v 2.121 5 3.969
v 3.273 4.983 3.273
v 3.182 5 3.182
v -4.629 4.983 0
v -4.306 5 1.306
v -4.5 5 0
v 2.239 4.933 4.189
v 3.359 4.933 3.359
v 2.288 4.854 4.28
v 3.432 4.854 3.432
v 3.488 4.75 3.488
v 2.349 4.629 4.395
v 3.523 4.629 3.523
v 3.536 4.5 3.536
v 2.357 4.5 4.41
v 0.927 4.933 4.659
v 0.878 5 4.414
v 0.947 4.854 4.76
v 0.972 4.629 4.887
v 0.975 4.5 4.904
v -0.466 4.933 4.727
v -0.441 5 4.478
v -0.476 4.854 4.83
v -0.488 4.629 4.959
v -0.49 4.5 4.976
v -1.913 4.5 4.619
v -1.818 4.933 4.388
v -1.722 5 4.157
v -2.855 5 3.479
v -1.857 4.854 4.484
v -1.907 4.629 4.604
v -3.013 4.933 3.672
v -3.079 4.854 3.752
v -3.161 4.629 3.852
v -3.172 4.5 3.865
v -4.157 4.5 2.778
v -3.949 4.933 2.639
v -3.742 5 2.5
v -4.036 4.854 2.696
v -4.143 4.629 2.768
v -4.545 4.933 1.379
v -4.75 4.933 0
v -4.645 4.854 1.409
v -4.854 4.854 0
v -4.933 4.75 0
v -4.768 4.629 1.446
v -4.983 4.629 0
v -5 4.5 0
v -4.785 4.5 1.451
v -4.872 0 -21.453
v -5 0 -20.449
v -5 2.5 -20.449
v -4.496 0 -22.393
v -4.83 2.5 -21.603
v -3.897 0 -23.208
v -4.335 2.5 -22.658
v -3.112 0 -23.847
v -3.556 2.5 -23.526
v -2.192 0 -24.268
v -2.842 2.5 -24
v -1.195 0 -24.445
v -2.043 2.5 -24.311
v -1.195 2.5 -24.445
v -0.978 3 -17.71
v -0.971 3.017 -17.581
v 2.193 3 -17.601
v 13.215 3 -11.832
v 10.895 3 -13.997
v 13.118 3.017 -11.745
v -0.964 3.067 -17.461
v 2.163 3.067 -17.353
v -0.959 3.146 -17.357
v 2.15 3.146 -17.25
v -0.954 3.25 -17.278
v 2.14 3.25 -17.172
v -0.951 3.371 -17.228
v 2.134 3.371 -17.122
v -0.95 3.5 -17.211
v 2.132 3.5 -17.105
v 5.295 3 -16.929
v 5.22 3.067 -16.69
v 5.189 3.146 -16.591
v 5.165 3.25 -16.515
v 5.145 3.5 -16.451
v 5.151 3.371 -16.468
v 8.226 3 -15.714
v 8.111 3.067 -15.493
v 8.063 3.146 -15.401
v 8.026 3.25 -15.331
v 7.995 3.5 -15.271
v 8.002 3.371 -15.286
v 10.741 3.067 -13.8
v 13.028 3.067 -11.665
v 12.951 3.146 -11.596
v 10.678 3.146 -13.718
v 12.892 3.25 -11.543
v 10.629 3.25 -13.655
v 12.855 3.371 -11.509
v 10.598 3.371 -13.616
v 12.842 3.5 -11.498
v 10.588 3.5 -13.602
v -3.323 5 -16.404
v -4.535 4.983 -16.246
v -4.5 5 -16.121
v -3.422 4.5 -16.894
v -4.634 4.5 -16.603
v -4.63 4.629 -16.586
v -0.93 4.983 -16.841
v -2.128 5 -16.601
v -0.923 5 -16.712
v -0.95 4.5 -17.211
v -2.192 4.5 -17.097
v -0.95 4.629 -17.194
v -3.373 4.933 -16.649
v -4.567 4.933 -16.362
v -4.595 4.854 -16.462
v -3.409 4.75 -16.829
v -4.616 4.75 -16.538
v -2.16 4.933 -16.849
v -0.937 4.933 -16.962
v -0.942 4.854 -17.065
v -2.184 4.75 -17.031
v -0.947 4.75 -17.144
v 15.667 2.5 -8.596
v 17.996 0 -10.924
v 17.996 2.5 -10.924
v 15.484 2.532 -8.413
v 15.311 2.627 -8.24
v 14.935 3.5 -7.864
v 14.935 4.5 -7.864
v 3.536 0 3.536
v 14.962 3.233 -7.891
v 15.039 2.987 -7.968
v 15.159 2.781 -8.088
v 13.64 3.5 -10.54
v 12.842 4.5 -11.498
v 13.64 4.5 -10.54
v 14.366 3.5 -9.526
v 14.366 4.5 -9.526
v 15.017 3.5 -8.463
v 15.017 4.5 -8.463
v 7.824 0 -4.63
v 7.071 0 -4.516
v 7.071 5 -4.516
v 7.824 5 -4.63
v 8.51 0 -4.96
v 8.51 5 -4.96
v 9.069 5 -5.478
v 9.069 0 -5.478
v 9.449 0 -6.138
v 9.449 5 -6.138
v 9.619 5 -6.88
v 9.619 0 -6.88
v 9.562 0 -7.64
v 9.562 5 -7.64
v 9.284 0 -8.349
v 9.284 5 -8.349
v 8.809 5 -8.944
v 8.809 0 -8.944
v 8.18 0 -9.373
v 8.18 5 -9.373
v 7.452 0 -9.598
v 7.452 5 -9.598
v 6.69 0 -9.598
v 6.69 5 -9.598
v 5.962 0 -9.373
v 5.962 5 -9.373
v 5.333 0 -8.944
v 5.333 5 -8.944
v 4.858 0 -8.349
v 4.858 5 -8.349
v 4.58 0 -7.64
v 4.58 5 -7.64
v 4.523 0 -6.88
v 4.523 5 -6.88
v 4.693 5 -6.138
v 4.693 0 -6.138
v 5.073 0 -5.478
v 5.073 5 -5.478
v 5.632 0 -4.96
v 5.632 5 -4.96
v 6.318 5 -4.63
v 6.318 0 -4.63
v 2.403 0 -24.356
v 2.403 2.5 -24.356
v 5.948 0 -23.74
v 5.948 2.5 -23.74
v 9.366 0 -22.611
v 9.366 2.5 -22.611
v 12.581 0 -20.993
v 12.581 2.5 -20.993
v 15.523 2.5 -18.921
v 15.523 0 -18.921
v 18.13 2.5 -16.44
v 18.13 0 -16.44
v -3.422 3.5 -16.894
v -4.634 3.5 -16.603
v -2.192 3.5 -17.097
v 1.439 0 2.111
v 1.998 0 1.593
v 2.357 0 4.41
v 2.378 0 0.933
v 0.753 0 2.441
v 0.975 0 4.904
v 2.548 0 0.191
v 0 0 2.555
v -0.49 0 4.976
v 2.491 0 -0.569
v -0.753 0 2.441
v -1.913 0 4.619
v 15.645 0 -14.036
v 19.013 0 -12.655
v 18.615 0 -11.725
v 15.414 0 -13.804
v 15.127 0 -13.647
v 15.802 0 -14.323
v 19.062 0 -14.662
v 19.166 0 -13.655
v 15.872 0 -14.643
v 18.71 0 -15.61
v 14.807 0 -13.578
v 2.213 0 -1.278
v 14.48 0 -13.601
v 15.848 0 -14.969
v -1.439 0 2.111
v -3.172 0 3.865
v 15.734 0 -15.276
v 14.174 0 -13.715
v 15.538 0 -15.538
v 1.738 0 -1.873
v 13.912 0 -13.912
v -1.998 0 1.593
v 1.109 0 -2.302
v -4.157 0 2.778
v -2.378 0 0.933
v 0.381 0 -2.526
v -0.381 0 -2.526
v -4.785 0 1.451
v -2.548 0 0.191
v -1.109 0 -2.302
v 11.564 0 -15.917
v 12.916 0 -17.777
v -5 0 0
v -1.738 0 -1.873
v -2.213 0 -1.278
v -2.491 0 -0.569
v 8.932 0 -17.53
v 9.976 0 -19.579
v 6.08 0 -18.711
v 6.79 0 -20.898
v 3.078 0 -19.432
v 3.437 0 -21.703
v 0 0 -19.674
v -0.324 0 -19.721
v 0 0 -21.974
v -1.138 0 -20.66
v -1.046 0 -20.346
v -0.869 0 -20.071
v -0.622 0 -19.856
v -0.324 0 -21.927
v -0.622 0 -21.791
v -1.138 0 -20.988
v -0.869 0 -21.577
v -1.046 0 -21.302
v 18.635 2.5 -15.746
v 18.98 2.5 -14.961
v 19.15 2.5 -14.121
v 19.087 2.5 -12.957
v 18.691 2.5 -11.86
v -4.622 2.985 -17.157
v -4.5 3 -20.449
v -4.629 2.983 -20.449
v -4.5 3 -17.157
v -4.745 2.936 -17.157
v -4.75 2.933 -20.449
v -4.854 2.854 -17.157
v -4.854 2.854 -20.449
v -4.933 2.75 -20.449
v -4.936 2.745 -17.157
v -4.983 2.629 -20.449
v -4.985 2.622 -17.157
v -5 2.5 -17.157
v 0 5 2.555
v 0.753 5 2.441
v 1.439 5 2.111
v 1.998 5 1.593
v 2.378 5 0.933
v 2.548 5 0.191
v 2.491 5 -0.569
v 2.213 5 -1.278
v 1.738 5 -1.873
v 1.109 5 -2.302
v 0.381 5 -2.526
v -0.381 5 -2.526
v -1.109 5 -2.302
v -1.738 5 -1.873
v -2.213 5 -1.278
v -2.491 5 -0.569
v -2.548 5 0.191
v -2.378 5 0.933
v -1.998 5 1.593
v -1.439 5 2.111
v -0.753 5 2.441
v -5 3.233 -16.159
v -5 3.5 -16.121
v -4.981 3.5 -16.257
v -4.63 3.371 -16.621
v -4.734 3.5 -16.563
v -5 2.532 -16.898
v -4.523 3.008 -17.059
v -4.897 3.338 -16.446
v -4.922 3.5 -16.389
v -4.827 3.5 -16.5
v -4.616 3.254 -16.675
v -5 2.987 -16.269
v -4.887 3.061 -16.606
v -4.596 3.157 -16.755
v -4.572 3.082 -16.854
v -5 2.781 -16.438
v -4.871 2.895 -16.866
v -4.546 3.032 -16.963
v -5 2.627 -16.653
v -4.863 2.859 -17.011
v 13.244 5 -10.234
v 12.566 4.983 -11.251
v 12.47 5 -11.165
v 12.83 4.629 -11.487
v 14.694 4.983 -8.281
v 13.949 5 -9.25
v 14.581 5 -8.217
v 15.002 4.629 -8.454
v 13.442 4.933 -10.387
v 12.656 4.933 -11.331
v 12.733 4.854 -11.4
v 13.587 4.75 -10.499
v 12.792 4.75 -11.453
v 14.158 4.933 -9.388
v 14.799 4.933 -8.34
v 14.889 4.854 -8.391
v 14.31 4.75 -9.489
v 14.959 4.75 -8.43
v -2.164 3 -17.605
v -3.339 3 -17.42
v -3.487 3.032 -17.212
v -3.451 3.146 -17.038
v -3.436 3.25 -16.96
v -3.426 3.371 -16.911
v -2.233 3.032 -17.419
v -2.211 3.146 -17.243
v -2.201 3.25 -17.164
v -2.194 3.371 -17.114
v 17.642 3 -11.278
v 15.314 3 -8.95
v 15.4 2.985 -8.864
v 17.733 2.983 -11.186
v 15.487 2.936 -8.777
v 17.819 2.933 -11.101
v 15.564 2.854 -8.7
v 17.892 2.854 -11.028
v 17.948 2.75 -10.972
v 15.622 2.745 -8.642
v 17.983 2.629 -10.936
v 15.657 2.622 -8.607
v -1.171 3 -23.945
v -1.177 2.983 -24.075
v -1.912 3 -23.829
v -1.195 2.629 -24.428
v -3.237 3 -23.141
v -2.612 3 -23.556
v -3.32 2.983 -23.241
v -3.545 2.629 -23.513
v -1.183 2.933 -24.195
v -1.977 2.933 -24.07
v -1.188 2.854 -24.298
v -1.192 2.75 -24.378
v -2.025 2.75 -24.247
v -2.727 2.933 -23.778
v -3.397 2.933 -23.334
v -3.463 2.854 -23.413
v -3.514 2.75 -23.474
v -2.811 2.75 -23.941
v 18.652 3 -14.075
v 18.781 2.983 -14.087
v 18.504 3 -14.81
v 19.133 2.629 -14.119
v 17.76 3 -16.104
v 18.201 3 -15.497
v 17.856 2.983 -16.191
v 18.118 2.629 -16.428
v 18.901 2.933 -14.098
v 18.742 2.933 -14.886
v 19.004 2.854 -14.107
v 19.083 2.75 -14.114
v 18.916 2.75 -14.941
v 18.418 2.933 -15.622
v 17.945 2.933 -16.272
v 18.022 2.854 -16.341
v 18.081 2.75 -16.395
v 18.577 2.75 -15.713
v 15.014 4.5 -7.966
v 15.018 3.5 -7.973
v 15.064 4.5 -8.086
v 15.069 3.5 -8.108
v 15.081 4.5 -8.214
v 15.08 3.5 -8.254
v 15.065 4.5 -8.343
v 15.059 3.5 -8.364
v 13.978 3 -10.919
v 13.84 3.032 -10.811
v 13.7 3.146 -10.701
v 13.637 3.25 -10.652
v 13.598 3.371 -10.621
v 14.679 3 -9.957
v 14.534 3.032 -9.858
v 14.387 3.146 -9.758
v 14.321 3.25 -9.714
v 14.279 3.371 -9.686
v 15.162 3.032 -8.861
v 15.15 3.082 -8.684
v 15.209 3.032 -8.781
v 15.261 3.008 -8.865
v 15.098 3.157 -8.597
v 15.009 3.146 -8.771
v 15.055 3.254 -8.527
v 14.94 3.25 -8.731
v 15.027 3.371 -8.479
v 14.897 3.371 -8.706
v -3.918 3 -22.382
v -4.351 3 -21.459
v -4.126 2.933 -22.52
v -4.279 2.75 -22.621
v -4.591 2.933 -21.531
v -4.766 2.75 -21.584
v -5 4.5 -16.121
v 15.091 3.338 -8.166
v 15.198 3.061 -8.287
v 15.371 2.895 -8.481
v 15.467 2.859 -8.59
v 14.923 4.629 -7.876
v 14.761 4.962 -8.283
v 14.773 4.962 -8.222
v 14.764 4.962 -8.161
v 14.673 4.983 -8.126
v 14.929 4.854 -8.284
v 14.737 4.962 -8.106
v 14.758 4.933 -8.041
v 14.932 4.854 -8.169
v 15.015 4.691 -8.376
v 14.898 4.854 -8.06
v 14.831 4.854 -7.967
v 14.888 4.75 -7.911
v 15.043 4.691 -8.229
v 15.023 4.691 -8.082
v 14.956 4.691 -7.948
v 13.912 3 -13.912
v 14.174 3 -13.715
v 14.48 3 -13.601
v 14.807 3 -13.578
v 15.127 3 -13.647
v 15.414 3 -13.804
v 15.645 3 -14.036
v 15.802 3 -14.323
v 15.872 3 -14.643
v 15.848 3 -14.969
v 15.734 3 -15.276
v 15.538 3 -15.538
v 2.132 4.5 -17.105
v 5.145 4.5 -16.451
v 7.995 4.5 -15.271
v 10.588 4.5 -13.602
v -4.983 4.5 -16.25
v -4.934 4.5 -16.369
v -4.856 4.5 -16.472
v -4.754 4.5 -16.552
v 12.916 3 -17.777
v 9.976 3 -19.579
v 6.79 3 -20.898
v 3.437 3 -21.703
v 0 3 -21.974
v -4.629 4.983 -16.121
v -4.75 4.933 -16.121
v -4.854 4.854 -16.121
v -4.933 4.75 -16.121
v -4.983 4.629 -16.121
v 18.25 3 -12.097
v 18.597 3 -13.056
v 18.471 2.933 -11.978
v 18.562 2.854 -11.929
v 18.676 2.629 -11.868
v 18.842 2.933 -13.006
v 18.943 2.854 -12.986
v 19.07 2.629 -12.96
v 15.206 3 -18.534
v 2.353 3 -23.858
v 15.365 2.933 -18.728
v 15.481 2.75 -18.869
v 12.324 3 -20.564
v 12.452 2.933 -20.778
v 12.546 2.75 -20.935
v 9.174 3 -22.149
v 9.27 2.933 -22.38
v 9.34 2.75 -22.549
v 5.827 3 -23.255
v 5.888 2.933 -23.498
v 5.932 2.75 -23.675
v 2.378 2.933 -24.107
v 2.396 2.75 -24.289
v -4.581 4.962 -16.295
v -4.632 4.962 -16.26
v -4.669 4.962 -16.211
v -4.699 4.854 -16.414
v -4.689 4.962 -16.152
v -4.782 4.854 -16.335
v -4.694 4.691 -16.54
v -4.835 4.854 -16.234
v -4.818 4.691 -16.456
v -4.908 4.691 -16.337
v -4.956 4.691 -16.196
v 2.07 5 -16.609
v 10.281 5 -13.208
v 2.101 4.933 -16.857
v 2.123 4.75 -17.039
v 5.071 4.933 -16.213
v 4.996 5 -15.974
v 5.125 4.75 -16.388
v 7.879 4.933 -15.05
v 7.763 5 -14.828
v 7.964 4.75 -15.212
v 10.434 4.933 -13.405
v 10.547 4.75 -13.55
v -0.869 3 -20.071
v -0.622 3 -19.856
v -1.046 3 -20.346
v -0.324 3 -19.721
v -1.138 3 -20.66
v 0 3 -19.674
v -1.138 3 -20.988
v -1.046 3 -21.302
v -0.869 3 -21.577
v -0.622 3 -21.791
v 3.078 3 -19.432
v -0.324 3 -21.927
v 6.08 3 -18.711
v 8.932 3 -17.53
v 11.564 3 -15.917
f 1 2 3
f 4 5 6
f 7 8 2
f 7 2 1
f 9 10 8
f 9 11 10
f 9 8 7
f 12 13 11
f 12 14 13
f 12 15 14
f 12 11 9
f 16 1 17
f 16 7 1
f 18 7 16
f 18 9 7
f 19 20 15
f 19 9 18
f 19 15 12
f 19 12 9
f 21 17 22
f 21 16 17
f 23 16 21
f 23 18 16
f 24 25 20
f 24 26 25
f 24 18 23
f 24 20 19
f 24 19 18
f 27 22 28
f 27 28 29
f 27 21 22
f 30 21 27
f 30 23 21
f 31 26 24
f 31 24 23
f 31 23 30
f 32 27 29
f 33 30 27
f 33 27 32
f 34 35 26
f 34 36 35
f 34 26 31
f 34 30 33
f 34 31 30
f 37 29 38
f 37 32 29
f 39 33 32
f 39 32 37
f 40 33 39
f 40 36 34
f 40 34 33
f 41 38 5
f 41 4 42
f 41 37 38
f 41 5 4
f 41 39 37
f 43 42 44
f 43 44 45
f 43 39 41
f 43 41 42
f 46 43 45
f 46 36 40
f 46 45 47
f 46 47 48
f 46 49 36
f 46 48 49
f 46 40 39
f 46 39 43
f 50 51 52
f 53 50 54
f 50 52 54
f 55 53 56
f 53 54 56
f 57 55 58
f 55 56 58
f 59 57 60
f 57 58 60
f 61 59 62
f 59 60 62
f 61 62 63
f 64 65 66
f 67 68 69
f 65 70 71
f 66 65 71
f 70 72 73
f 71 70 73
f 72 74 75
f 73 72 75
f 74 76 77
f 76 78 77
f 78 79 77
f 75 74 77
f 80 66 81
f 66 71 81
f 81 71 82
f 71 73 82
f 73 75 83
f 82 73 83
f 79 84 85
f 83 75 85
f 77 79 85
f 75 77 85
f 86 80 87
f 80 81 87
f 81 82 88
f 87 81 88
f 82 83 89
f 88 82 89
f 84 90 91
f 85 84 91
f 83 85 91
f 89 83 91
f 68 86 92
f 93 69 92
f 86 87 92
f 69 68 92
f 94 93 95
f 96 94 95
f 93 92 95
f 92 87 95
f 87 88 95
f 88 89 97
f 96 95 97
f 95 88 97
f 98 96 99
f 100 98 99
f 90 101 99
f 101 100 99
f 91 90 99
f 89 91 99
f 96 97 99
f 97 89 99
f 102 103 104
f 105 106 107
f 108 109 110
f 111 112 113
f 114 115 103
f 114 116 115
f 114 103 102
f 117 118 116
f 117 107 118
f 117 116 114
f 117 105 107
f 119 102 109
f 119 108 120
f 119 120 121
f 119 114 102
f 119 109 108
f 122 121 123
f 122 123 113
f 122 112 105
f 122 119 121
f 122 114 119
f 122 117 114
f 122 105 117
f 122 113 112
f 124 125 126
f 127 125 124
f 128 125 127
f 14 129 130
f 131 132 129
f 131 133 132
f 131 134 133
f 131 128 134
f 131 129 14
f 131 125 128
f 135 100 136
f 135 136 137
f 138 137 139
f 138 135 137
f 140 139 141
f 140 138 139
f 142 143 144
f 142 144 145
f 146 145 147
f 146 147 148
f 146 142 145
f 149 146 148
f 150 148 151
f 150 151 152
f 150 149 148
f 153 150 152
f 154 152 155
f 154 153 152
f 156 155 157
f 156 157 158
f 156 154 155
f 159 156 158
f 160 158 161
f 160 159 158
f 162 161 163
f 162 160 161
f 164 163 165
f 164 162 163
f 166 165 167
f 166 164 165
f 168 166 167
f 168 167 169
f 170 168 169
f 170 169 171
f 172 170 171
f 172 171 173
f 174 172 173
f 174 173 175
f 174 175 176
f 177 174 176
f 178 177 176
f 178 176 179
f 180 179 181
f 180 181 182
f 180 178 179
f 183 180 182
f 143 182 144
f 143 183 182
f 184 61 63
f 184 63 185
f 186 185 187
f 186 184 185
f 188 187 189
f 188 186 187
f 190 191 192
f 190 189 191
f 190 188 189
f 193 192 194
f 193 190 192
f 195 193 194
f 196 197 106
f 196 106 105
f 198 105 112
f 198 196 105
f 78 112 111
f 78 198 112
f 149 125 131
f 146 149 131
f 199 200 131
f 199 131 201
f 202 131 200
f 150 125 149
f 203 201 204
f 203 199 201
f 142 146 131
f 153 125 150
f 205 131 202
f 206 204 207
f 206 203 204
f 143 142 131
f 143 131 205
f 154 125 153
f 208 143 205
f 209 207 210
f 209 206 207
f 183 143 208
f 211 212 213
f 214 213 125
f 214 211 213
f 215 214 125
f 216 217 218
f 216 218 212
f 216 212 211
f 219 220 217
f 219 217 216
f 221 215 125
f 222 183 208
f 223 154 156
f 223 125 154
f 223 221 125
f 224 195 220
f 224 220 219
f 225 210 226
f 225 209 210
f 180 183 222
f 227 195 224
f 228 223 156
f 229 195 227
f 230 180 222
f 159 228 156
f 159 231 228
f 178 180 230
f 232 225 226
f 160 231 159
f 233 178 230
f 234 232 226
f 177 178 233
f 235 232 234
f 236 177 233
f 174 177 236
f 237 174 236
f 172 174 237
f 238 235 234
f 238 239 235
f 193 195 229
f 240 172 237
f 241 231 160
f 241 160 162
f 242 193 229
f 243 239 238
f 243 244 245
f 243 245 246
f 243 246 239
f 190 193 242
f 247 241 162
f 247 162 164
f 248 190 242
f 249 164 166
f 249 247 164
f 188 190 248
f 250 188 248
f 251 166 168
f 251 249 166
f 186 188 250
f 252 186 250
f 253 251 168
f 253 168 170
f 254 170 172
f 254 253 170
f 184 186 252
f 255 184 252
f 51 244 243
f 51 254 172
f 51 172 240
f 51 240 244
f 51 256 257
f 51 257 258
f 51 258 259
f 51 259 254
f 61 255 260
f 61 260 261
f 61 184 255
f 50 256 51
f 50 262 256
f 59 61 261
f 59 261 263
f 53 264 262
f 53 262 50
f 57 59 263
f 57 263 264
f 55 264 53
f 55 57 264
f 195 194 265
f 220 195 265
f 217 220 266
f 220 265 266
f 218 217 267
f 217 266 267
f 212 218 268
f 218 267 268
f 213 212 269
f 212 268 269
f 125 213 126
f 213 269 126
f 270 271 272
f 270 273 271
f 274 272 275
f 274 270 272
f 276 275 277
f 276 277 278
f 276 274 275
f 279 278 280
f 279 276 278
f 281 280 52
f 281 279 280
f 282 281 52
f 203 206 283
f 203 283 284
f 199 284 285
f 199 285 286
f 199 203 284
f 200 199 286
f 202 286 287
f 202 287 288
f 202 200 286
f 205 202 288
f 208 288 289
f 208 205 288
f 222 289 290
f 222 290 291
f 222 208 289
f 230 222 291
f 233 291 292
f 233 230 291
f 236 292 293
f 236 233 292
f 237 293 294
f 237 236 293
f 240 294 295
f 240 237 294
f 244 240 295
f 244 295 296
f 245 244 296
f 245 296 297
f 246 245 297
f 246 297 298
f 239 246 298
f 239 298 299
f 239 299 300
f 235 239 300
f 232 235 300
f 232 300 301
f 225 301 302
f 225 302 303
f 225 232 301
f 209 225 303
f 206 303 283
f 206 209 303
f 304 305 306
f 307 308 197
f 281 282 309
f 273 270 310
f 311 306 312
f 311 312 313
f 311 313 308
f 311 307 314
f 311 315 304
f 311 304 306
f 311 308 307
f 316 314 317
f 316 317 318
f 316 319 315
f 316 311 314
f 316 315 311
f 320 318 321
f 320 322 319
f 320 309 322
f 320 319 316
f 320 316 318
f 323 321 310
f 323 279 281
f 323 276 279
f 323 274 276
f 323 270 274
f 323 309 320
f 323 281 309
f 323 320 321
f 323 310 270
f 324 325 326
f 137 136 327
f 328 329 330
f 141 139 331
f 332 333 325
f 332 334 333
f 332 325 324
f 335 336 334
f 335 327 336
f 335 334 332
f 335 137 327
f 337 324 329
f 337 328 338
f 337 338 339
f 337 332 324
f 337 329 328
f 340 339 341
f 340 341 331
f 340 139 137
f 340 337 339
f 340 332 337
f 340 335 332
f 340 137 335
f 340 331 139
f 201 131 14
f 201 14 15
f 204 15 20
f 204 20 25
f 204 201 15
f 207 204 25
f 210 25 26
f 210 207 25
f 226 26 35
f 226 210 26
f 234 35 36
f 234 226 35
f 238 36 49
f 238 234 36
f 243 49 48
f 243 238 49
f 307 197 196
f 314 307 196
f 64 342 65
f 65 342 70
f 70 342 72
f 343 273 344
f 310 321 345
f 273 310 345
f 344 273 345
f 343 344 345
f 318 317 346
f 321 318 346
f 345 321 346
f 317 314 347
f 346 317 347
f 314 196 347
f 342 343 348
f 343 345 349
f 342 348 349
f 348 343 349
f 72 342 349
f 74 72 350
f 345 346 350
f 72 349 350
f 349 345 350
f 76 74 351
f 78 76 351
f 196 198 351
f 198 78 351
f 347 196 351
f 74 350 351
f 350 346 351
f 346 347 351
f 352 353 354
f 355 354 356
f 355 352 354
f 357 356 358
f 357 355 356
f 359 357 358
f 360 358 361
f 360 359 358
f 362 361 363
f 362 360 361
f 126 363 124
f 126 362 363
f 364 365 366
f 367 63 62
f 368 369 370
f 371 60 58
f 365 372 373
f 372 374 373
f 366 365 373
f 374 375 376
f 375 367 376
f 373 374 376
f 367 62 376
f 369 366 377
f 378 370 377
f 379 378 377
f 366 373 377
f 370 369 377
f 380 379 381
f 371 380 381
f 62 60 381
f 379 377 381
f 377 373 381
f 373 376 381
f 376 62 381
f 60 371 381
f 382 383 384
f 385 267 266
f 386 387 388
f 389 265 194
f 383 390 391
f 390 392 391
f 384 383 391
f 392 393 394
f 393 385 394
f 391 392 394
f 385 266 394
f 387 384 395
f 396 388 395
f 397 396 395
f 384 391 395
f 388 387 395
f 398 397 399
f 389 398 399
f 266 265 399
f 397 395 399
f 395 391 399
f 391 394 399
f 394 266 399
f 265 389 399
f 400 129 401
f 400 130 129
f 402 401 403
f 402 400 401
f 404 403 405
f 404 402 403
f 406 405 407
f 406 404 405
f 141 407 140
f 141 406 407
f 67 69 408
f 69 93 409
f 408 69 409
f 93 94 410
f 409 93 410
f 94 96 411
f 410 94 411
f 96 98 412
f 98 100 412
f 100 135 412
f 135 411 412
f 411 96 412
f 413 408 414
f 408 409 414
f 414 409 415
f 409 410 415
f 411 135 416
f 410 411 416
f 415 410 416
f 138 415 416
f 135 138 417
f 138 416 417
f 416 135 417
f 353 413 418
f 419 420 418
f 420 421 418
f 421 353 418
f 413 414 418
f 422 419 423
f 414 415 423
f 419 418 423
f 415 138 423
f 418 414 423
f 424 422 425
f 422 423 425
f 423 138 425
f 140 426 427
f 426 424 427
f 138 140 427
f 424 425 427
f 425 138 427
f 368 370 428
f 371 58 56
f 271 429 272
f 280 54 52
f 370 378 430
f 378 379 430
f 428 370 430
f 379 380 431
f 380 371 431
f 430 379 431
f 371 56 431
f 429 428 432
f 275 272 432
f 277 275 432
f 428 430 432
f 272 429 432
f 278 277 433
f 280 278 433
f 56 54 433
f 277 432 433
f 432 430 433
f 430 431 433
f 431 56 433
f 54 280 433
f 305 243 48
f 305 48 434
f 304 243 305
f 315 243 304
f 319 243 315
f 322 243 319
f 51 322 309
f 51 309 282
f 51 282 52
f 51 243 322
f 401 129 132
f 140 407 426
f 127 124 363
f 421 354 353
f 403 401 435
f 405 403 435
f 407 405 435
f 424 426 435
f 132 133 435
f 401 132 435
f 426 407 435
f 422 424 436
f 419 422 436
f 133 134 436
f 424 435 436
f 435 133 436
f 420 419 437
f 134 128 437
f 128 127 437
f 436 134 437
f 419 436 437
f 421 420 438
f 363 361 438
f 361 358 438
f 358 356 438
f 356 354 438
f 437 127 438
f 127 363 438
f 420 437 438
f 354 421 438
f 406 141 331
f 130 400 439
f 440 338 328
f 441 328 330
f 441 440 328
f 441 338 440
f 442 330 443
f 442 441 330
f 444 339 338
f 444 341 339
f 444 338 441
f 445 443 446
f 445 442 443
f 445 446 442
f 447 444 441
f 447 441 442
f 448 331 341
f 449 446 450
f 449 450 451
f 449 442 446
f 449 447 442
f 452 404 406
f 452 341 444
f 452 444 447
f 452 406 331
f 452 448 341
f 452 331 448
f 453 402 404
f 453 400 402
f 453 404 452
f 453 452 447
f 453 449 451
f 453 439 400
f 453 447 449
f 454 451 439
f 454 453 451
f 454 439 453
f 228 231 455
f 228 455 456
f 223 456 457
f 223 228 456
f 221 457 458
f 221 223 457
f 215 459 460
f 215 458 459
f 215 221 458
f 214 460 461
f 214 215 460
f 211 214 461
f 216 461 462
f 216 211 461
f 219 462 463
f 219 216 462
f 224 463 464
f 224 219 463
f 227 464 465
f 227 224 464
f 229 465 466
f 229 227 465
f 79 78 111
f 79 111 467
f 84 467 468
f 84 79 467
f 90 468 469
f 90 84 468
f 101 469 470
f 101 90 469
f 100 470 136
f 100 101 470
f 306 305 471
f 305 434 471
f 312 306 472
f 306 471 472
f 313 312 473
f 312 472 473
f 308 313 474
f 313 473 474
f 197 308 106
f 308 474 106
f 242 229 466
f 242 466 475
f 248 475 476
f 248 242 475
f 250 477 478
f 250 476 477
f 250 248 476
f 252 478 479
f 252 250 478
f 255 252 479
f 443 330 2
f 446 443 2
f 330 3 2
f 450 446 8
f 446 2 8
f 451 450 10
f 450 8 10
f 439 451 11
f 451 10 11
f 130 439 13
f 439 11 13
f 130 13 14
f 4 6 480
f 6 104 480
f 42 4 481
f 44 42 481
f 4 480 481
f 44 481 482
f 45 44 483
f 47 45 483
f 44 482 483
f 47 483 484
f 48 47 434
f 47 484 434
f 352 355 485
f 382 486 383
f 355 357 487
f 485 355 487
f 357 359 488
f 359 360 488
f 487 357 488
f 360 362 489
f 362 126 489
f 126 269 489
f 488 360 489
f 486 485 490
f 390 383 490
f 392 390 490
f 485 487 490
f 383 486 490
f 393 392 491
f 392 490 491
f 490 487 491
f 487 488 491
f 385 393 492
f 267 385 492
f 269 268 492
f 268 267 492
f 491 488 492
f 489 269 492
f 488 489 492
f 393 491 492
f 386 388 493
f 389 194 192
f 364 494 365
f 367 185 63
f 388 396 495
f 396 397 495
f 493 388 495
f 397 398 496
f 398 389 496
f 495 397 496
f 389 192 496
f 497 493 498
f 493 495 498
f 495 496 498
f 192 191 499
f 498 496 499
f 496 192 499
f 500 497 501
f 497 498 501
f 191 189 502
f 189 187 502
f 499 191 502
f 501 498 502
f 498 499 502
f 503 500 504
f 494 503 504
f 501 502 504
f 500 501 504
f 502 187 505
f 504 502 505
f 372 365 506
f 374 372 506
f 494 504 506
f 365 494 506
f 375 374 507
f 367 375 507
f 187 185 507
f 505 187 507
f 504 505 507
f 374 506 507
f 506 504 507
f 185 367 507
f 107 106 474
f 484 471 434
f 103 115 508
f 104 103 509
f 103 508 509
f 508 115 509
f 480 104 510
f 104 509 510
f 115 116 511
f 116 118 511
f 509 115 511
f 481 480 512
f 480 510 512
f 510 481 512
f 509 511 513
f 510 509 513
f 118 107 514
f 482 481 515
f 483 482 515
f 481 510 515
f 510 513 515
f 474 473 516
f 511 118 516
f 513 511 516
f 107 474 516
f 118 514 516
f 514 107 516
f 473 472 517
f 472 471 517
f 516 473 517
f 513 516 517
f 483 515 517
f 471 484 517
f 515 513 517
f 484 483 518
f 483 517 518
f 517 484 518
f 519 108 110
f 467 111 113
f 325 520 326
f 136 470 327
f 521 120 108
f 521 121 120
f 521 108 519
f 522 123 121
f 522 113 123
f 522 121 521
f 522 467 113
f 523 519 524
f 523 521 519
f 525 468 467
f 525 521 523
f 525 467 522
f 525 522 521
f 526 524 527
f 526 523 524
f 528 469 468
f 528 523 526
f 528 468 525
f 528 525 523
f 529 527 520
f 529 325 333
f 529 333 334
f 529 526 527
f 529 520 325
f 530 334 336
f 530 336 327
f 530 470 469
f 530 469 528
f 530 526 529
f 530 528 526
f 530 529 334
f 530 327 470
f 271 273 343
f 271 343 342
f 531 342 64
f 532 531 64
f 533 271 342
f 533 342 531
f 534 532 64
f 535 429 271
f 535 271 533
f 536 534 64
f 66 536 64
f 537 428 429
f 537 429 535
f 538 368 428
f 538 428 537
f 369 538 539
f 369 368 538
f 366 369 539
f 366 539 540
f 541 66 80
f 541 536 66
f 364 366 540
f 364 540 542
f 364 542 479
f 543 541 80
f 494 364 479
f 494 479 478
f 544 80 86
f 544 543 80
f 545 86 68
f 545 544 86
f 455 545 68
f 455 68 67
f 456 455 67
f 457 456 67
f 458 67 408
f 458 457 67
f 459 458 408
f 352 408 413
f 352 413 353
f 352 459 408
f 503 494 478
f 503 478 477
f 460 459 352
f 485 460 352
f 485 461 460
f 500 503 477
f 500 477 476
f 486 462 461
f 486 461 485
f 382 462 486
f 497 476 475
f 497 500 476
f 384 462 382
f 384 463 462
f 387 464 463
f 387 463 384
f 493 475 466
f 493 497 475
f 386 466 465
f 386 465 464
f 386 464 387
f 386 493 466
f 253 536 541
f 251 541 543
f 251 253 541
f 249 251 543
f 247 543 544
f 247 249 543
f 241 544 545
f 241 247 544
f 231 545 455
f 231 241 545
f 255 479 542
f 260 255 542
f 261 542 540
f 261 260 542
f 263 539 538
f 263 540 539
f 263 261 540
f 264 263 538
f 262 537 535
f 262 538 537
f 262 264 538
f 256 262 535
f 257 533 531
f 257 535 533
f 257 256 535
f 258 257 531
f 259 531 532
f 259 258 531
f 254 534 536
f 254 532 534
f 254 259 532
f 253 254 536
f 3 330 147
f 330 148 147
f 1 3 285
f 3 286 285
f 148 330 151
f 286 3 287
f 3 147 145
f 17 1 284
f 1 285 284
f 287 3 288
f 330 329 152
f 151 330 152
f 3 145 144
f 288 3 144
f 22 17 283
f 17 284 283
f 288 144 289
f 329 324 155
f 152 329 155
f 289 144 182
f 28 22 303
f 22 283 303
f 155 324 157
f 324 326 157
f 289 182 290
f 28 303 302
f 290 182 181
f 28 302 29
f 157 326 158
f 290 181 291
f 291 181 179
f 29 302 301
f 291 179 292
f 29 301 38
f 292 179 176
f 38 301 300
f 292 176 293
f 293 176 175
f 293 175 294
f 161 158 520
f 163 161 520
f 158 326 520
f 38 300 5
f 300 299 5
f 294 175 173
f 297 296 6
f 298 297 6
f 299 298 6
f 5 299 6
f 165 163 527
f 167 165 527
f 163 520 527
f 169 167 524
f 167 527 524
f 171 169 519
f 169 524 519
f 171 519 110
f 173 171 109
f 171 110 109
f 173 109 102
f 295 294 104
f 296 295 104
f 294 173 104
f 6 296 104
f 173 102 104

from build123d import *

# Parameters (mm, degrees)
SKETCH1_R           = 2.555
BOSS_EXTRUDE1_DEPTH = 5
FILLET1_R           = 4
CUT_EXTRUDE1_START  = -2
CUT_EXTRUDE1_DEPTH  = 2
FILLET3_R           = 0.5


with BuildPart() as part:
    # Sketch1 → Boss-Extrude1 (new body)
    with BuildSketch(Plane(origin=(0, 0, 0), x_dir=(1, 0, 0), z_dir=(0, 1, 0))):
        with BuildLine():
            Line((-5, 0), (-5, 23.957730656))
            ThreePointArc((-5, 23.957730656), (9.365764476, 22.610955619), (20.476207715, 13.405139903))
            Line((20.476207715, 13.405139903), (3.535533906, -3.535533906))
            ThreePointArc((3.535533906, -3.535533906), (-1.913417162, -4.619397663), (-5, 0))
        make_face()
        with Locations(Location((0, 0, 0), (0, 0, 270))):
            Circle(SKETCH1_R, mode=Mode.SUBTRACT)
        with Locations(Location((7.071067812, 7.071067812, 0), (0, 0, 270))):
            Circle(SKETCH1_R, mode=Mode.SUBTRACT)
        with BuildLine():
            ThreePointArc((0, 21.973922003), (-1.15, 20.823922003), (0, 19.673922003))
            ThreePointArc((0, 19.673922003), (7.528884, 18.176333863), (13.911563661, 13.911563661))
            ThreePointArc((13.911563661, 13.911563661), (15.537909258, 13.911563661), (15.537909258, 15.537909258))
            ThreePointArc((15.537909258, 15.537909258), (8.409055895, 20.301256788), (0, 21.973922003))
        make_face(mode=Mode.SUBTRACT)
    extrude(amount=BOSS_EXTRUDE1_DEPTH)

    # Fillet1
    fillet1_edges = [part.edges().sort_by_distance(p)[0] for p in [
        (-5, 2.5, -23.957730656),
        (20.476207715, 2.5, -13.405139903),
    ]]
    fillet(fillet1_edges, radius=FILLET1_R)

    # Sketch2 → Cut-Extrude1 (cut)
    # profile 1 of 3: a face of its own
    with BuildSketch(Plane(origin=(0, 5, 0), x_dir=(1, 0, 0), z_dir=(0, 1, 0)).offset(CUT_EXTRUDE1_START)):
        with BuildLine():
            ThreePointArc((17.995504206, 10.924436395), (18.929126851, 12.393826533), (19.150132948, 14.120648738))
            ThreePointArc((19.150132948, 14.120648738), (16.926987938, 10.570555283), (12.842220443, 11.498031317))
            ThreePointArc((12.842220443, 11.498031317), (14.122014888, 9.884130998), (15.200167421, 8.129099609))
            Line((15.200167421, 8.129099609), (17.995504206, 10.924436395))
        make_face()
    # profile 2 of 3: a face of its own
    with BuildSketch(Plane(origin=(0, 5, 0), x_dir=(1, 0, 0), z_dir=(0, 1, 0)).offset(CUT_EXTRUDE1_START)):
        with BuildLine():
            ThreePointArc((19.150132948, 14.120648738), (18.82866037, 15.363083326), (18.130276234, 16.439767087))
            ThreePointArc((18.130276234, 16.439767087), (9.365764476, 22.610955619), (-1.195370482, 24.444712058))
            ThreePointArc((-1.195370482, 24.444712058), (-2.450533029, 24.177213828), (-3.556382391, 23.525995345))
            ThreePointArc((-3.556382391, 23.525995345), (-4.494676634, 19.443699277), (-0.950485246, 17.211157075))
            ThreePointArc((-0.950485246, 17.211157075), (6.59646064, 15.925264742), (12.842220443, 11.498031317))
            ThreePointArc((12.842220443, 11.498031317), (16.926987938, 10.570555283), (19.150132948, 14.120648738))
        make_face()
        with BuildLine():
            ThreePointArc((0, 19.673922003), (-1.15, 20.823922003), (0, 21.973922003))
            ThreePointArc((0, 21.973922003), (8.409055895, 20.301256788), (15.537909258, 15.537909258))
            ThreePointArc((15.537909258, 15.537909258), (15.537909258, 13.911563661), (13.911563661, 13.911563661))
            ThreePointArc((13.911563661, 13.911563661), (7.528884, 18.176333863), (0, 19.673922003))
        make_face(mode=Mode.SUBTRACT)
    # profile 3 of 3: a face of its own
    with BuildSketch(Plane(origin=(0, 5, 0), x_dir=(1, 0, 0), z_dir=(0, 1, 0)).offset(CUT_EXTRUDE1_START)):
        with BuildLine():
            ThreePointArc((-0.950485246, 17.211157075), (-4.494676634, 19.443699277), (-3.556382391, 23.525995345))
            ThreePointArc((-3.556382391, 23.525995345), (-4.621155172, 22.148672745), (-5, 20.44948611))
            Line((-5, 20.44948611), (-5, 16.496282917))
            ThreePointArc((-5, 16.496282917), (-2.996636437, 16.974908546), (-0.950485246, 17.211157075))
        make_face()
    extrude(amount=CUT_EXTRUDE1_DEPTH, mode=Mode.SUBTRACT)

    # Fillet3
    fillet3_edges = [part.edges().sort_by_distance(p)[0] for p in [
        (-1.913417162, 5, 4.619397663),
        (-5, 5, -8.248141459),
        (19.165883391, 3, -13.655149118),
        (16.597835814, 3, -9.526768002),
        (6.59646064, 3, -15.925264742),
        (15.200167421, 4, -8.129099609),
        (-5, 3, -18.472884514),
        (-5, 4, -16.496282917),
        (-3.896677573, 3, -23.207974653),
        (9.365764476, 3, -22.610955619),
        (6.59646064, 5, -15.925264742),
        (9.367850663, 5, -2.296782852),
    ]]
    fillet(fillet3_edges, radius=FILLET3_R)


solid = part.part
